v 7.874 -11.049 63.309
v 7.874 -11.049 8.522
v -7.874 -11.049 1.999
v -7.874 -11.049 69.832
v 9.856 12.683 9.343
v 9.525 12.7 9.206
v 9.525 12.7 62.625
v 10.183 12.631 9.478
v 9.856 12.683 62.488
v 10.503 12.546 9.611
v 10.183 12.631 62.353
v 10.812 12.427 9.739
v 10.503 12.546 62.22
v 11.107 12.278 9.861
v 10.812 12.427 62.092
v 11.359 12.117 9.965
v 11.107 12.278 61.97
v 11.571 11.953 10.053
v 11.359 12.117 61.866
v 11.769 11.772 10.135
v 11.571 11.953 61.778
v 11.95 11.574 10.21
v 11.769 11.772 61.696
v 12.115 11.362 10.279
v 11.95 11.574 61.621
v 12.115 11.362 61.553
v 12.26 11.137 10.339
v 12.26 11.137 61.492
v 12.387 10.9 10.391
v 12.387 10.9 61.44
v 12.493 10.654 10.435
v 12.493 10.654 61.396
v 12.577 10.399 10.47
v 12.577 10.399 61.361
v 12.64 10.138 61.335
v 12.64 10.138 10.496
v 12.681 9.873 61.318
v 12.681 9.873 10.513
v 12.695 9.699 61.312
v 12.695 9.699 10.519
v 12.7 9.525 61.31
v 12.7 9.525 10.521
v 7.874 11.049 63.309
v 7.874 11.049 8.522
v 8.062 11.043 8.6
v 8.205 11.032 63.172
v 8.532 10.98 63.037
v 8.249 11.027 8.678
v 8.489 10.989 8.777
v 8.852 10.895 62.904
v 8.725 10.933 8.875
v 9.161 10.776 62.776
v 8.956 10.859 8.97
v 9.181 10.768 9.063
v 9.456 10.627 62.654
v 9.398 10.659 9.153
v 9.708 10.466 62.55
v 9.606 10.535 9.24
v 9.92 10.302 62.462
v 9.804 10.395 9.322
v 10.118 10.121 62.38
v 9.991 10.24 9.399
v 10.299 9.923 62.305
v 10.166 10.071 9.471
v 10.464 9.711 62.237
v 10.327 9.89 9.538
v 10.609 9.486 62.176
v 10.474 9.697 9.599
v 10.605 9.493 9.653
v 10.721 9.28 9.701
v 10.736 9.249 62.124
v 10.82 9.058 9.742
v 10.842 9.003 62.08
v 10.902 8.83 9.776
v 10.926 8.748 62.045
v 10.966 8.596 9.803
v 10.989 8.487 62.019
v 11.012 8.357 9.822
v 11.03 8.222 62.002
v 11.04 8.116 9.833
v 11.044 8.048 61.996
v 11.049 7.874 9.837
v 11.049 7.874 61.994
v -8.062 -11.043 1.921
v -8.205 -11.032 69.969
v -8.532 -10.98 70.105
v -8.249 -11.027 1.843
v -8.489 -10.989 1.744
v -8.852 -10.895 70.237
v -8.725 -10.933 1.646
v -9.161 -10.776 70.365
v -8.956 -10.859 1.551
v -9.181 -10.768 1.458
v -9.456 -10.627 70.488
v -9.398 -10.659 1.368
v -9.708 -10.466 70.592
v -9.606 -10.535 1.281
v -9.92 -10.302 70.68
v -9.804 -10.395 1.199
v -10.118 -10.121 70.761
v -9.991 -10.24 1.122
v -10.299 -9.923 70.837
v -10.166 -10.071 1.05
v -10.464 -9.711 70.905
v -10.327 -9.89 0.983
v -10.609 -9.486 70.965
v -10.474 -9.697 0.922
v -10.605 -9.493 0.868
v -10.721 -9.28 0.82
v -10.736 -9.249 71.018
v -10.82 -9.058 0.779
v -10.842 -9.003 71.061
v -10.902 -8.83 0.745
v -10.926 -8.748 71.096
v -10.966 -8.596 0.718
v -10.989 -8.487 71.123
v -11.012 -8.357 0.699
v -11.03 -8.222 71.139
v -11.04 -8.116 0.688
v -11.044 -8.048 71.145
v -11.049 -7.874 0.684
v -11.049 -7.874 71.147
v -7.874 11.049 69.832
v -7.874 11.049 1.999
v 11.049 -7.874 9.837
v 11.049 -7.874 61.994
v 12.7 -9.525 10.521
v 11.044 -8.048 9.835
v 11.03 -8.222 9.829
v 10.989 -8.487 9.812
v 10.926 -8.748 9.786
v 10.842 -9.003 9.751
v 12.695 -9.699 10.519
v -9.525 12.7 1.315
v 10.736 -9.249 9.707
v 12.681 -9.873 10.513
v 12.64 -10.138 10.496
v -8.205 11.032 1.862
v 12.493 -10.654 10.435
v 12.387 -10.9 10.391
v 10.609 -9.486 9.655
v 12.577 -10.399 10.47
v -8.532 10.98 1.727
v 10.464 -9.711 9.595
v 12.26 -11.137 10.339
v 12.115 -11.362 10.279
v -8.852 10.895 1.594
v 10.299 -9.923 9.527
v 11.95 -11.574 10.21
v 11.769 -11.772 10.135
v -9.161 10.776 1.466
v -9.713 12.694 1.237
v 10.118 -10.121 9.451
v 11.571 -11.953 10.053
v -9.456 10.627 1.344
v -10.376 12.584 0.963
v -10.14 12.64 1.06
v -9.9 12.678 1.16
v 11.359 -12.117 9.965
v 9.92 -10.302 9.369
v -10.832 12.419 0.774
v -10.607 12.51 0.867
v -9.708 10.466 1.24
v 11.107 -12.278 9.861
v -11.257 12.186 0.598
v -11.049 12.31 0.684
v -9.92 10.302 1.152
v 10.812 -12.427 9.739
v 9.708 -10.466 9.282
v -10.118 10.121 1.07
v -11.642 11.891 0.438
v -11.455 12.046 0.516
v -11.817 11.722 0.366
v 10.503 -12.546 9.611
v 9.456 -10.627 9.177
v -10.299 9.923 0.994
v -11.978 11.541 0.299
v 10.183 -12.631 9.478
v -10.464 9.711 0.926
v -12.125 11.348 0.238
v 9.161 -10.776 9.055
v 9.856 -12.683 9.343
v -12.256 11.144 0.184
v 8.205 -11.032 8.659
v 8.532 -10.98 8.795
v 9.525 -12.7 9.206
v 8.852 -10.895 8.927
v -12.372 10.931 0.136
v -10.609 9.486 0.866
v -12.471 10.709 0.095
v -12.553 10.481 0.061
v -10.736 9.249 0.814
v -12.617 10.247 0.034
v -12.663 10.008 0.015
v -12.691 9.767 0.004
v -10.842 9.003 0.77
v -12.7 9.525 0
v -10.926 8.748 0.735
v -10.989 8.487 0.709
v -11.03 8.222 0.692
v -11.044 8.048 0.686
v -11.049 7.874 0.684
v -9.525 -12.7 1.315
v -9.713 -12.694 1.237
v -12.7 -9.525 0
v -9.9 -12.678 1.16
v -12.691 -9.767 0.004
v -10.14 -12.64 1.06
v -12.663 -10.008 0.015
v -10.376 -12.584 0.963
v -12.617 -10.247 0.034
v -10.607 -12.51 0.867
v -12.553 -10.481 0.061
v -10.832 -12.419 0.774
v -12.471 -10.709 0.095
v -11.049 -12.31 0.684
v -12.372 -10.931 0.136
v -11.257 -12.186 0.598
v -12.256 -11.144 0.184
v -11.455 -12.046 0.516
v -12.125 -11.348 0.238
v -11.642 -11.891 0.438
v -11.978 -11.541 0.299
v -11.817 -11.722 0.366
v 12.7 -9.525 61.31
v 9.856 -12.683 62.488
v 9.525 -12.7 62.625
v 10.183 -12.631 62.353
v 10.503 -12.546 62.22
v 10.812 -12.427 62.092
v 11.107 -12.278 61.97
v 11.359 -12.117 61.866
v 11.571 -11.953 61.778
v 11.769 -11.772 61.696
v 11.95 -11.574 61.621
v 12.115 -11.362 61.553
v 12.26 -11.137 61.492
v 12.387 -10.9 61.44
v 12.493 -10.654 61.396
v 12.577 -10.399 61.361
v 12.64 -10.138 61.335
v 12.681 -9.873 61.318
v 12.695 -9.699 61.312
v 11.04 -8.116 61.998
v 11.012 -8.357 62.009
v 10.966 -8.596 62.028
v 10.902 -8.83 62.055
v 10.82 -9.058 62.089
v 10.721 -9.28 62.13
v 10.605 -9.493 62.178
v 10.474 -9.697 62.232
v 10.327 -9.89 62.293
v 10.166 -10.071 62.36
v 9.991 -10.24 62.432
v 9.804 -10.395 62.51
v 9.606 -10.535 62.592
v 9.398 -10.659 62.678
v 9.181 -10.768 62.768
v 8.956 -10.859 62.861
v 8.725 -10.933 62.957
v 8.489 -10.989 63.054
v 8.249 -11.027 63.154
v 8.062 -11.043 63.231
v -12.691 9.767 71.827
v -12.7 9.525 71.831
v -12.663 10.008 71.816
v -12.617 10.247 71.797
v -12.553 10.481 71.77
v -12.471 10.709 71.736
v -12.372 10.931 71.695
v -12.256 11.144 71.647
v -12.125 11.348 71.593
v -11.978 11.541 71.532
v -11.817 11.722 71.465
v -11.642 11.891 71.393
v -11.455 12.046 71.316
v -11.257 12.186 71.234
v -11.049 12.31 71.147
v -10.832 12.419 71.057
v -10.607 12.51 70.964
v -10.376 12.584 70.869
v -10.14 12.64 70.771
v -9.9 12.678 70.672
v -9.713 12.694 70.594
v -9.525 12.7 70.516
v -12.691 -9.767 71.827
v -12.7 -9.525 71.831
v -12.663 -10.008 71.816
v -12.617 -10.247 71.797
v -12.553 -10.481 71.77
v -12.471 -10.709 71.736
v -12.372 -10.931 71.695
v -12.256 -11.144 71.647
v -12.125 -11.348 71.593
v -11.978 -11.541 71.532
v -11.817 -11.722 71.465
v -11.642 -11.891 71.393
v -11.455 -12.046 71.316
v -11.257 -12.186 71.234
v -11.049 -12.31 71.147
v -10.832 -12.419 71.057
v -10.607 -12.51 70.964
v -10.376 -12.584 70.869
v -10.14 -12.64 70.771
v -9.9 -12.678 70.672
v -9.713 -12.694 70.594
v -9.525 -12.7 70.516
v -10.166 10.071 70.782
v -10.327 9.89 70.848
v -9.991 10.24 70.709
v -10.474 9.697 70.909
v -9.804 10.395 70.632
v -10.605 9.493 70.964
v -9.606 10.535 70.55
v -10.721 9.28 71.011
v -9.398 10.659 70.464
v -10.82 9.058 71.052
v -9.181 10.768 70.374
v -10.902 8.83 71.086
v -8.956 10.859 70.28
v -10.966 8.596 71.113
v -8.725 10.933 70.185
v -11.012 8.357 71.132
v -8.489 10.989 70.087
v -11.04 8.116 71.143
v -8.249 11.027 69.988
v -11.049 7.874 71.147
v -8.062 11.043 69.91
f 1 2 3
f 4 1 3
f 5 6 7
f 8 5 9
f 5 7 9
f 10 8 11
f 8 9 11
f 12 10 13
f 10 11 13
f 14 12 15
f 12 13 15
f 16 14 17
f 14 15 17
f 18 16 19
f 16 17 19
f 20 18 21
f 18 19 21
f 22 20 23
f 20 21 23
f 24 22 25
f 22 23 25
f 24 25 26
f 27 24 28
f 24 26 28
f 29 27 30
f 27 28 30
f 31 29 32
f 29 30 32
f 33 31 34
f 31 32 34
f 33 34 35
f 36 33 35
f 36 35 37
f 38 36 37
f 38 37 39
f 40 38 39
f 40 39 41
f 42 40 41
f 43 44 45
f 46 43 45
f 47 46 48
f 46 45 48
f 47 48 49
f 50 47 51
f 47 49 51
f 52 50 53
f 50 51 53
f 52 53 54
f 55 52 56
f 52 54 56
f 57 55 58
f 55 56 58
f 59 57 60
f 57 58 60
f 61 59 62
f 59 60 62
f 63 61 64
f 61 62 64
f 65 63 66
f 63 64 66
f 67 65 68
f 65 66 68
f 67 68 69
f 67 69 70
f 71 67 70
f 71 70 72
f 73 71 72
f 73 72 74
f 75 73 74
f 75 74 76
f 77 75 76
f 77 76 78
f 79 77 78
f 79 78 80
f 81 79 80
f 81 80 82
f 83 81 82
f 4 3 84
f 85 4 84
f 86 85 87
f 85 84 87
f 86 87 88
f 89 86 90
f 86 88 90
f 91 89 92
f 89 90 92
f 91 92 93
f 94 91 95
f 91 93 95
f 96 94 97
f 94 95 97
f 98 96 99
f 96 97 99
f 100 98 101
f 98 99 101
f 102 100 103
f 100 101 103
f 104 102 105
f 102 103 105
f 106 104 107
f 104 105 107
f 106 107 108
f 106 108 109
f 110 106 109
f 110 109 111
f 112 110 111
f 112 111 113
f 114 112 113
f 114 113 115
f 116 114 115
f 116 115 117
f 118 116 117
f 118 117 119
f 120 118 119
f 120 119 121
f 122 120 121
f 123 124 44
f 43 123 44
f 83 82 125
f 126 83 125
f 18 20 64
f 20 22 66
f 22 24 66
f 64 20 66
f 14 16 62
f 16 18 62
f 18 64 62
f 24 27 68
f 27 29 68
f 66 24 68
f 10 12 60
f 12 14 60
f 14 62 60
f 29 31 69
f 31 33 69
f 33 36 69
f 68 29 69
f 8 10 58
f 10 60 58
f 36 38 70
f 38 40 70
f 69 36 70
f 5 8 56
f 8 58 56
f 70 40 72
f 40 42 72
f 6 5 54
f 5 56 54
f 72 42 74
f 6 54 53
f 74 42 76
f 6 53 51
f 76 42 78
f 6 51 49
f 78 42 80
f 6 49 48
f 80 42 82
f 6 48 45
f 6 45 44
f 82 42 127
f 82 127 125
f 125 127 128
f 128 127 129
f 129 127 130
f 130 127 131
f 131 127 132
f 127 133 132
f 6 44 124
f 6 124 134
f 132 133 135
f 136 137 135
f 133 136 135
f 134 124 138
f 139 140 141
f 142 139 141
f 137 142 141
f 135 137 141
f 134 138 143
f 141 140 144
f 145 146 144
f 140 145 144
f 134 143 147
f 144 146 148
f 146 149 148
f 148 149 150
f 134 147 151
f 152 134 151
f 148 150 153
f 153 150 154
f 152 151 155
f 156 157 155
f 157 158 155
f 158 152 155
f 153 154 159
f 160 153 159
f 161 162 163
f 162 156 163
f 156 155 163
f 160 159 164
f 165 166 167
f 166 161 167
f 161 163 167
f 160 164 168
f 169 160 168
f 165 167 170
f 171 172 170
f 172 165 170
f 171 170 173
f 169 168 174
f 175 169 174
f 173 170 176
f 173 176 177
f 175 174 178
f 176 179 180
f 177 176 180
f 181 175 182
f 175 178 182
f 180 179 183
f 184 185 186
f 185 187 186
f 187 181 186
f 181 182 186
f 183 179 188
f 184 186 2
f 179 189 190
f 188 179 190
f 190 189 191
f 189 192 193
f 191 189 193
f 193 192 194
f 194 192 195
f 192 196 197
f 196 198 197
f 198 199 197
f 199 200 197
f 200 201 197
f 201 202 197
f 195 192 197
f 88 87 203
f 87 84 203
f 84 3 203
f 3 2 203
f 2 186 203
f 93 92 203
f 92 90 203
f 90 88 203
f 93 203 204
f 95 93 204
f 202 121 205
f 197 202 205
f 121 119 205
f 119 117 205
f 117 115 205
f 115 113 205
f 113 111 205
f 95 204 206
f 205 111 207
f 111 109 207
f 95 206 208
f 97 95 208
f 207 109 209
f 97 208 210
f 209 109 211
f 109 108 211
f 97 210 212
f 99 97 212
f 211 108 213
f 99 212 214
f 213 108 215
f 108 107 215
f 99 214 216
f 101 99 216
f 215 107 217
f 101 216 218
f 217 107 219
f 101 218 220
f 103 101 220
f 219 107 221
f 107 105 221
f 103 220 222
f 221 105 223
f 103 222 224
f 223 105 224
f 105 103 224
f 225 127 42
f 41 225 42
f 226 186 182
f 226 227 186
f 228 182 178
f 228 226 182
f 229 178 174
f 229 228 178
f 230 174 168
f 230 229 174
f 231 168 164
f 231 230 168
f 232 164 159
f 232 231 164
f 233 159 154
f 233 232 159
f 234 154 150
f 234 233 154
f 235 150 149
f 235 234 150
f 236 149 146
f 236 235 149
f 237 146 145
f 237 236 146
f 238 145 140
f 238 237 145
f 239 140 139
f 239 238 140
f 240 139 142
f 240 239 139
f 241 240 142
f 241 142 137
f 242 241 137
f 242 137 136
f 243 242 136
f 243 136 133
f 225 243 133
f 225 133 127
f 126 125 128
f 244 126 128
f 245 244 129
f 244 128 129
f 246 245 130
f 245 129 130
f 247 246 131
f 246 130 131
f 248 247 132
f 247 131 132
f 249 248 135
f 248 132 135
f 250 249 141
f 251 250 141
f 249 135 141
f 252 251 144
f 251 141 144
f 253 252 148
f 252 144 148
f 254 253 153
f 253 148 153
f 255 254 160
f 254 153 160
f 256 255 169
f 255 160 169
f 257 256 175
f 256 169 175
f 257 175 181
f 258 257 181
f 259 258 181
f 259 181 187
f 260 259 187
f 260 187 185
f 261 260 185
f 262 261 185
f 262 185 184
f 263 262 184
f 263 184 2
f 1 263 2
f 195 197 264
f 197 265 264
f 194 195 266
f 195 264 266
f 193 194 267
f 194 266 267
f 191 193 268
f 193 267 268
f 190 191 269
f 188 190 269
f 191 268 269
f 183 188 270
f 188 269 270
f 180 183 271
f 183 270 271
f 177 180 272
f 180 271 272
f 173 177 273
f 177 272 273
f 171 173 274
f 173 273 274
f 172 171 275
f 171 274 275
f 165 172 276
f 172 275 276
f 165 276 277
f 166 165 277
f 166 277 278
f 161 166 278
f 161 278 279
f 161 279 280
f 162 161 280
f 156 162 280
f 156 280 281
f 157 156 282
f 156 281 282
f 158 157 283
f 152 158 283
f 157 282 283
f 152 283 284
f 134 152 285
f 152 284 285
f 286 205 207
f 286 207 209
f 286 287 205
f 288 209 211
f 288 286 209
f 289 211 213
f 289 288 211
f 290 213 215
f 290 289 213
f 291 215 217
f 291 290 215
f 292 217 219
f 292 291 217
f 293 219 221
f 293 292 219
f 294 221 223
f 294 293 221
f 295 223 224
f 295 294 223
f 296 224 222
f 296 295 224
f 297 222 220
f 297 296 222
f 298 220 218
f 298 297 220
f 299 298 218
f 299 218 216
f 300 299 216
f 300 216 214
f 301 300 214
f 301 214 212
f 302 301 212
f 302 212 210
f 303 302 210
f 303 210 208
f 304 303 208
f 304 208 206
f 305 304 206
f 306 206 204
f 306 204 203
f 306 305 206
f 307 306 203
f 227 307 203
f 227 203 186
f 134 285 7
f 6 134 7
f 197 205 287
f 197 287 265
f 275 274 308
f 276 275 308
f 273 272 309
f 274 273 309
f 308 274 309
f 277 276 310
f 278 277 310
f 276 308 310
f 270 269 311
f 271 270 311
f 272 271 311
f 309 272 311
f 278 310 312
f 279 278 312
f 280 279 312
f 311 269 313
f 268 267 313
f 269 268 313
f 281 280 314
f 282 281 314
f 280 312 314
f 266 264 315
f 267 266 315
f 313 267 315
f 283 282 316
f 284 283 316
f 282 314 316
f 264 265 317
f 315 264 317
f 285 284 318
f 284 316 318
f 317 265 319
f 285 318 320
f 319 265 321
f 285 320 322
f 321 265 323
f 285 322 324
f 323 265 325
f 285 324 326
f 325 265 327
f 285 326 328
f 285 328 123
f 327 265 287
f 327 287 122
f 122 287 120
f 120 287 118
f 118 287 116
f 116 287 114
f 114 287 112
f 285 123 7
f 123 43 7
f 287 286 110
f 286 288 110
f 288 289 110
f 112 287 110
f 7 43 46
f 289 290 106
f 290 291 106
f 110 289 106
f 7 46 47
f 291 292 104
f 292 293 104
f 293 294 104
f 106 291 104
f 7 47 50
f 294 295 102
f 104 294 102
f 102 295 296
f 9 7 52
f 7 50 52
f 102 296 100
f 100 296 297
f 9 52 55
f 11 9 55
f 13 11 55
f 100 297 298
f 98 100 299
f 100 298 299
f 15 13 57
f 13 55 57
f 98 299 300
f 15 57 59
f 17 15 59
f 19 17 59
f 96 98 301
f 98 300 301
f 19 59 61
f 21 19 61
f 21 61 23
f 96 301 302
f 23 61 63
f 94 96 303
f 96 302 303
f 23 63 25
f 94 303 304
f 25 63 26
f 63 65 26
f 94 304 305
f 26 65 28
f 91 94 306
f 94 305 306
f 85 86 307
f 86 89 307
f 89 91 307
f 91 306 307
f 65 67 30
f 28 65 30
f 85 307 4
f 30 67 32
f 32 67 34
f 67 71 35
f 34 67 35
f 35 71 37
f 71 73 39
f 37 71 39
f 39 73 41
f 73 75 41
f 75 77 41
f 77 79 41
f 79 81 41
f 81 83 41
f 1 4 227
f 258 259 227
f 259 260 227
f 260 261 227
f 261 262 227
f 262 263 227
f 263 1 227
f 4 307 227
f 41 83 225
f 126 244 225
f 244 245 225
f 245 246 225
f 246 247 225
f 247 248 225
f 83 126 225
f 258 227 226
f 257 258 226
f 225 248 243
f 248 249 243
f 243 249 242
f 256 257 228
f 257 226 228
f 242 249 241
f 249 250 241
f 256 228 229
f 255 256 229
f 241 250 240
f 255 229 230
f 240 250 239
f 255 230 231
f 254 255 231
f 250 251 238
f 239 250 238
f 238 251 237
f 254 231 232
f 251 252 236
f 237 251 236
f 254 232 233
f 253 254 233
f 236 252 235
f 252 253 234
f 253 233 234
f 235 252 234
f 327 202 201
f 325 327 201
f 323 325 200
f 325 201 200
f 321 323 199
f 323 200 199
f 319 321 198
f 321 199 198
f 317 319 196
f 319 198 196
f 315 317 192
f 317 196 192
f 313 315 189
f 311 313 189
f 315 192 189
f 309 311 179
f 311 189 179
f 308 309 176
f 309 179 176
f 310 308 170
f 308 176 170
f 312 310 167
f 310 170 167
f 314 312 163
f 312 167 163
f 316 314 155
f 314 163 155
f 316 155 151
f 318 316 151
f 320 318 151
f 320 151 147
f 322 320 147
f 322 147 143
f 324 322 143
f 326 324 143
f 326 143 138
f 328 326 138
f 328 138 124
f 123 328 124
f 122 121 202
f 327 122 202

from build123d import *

# Parameters (mm, degrees)
F1_W     = 25.4
F1_H     = 25.4
F2_DEPTH = 71.8312
F4_DEPTH = 25.4
F5_R     = 3.175


# Not quite as in the source:
# - a variable given as a bare number and used for a length is read in inches; the dataset says mm whatever the document's units were
# - a feature names something its author has since deleted; it is built from what else it names


with BuildPart() as f2:
    # F1 (on Top) → F2 (new body)
    with BuildSketch(Plane.XY):
        Rectangle(F1_W, F1_H)
        with BuildLine():
            ThreePointArc((-11.049, 7.874), (-10.1190640303, 10.1190640303), (-7.874, 11.049))
            Line((-7.874, 11.049), (7.874, 11.049))
            ThreePointArc((7.874, 11.049), (10.1190640303, 10.1190640303), (11.049, 7.874))
            Line((11.049, 7.874), (11.049, -7.874))
            ThreePointArc((11.049, -7.874), (10.1190640303, -10.1190640303), (7.874, -11.049))
            Line((7.874, -11.049), (-7.874, -11.049))
            ThreePointArc((-7.874, -11.049), (-10.1190640303, -10.1190640303), (-11.049, -7.874))
            Line((-11.049, -7.874), (-11.049, 7.874))
        make_face(mode=Mode.SUBTRACT)
    extrude(amount=F2_DEPTH)

    # F3 (on face) → F4 (cut)
    with BuildSketch(Plane.XZ.offset(12.7)):
        Polygon((12.7, 10.5210244843), (-12.7, 0), (12.7, 0), align=None)
        Polygon((12.7, 71.8312), (-12.7, 71.8312), (12.7, 61.3101755157), align=None)
    extrude(amount=-F4_DEPTH, mode=Mode.SUBTRACT)

    # F5
    f5_edges = [f2.edges().sort_by_distance(p)[0] for p in [
        (-12.7, 12.7, 35.9156),
        (12.7, 12.7, 35.9156),
        (-12.7, -12.7, 35.9156),
        (12.7, -12.7, 35.9156),
    ]]
    fillet(f5_edges, radius=F5_R)


solid = f2.part
